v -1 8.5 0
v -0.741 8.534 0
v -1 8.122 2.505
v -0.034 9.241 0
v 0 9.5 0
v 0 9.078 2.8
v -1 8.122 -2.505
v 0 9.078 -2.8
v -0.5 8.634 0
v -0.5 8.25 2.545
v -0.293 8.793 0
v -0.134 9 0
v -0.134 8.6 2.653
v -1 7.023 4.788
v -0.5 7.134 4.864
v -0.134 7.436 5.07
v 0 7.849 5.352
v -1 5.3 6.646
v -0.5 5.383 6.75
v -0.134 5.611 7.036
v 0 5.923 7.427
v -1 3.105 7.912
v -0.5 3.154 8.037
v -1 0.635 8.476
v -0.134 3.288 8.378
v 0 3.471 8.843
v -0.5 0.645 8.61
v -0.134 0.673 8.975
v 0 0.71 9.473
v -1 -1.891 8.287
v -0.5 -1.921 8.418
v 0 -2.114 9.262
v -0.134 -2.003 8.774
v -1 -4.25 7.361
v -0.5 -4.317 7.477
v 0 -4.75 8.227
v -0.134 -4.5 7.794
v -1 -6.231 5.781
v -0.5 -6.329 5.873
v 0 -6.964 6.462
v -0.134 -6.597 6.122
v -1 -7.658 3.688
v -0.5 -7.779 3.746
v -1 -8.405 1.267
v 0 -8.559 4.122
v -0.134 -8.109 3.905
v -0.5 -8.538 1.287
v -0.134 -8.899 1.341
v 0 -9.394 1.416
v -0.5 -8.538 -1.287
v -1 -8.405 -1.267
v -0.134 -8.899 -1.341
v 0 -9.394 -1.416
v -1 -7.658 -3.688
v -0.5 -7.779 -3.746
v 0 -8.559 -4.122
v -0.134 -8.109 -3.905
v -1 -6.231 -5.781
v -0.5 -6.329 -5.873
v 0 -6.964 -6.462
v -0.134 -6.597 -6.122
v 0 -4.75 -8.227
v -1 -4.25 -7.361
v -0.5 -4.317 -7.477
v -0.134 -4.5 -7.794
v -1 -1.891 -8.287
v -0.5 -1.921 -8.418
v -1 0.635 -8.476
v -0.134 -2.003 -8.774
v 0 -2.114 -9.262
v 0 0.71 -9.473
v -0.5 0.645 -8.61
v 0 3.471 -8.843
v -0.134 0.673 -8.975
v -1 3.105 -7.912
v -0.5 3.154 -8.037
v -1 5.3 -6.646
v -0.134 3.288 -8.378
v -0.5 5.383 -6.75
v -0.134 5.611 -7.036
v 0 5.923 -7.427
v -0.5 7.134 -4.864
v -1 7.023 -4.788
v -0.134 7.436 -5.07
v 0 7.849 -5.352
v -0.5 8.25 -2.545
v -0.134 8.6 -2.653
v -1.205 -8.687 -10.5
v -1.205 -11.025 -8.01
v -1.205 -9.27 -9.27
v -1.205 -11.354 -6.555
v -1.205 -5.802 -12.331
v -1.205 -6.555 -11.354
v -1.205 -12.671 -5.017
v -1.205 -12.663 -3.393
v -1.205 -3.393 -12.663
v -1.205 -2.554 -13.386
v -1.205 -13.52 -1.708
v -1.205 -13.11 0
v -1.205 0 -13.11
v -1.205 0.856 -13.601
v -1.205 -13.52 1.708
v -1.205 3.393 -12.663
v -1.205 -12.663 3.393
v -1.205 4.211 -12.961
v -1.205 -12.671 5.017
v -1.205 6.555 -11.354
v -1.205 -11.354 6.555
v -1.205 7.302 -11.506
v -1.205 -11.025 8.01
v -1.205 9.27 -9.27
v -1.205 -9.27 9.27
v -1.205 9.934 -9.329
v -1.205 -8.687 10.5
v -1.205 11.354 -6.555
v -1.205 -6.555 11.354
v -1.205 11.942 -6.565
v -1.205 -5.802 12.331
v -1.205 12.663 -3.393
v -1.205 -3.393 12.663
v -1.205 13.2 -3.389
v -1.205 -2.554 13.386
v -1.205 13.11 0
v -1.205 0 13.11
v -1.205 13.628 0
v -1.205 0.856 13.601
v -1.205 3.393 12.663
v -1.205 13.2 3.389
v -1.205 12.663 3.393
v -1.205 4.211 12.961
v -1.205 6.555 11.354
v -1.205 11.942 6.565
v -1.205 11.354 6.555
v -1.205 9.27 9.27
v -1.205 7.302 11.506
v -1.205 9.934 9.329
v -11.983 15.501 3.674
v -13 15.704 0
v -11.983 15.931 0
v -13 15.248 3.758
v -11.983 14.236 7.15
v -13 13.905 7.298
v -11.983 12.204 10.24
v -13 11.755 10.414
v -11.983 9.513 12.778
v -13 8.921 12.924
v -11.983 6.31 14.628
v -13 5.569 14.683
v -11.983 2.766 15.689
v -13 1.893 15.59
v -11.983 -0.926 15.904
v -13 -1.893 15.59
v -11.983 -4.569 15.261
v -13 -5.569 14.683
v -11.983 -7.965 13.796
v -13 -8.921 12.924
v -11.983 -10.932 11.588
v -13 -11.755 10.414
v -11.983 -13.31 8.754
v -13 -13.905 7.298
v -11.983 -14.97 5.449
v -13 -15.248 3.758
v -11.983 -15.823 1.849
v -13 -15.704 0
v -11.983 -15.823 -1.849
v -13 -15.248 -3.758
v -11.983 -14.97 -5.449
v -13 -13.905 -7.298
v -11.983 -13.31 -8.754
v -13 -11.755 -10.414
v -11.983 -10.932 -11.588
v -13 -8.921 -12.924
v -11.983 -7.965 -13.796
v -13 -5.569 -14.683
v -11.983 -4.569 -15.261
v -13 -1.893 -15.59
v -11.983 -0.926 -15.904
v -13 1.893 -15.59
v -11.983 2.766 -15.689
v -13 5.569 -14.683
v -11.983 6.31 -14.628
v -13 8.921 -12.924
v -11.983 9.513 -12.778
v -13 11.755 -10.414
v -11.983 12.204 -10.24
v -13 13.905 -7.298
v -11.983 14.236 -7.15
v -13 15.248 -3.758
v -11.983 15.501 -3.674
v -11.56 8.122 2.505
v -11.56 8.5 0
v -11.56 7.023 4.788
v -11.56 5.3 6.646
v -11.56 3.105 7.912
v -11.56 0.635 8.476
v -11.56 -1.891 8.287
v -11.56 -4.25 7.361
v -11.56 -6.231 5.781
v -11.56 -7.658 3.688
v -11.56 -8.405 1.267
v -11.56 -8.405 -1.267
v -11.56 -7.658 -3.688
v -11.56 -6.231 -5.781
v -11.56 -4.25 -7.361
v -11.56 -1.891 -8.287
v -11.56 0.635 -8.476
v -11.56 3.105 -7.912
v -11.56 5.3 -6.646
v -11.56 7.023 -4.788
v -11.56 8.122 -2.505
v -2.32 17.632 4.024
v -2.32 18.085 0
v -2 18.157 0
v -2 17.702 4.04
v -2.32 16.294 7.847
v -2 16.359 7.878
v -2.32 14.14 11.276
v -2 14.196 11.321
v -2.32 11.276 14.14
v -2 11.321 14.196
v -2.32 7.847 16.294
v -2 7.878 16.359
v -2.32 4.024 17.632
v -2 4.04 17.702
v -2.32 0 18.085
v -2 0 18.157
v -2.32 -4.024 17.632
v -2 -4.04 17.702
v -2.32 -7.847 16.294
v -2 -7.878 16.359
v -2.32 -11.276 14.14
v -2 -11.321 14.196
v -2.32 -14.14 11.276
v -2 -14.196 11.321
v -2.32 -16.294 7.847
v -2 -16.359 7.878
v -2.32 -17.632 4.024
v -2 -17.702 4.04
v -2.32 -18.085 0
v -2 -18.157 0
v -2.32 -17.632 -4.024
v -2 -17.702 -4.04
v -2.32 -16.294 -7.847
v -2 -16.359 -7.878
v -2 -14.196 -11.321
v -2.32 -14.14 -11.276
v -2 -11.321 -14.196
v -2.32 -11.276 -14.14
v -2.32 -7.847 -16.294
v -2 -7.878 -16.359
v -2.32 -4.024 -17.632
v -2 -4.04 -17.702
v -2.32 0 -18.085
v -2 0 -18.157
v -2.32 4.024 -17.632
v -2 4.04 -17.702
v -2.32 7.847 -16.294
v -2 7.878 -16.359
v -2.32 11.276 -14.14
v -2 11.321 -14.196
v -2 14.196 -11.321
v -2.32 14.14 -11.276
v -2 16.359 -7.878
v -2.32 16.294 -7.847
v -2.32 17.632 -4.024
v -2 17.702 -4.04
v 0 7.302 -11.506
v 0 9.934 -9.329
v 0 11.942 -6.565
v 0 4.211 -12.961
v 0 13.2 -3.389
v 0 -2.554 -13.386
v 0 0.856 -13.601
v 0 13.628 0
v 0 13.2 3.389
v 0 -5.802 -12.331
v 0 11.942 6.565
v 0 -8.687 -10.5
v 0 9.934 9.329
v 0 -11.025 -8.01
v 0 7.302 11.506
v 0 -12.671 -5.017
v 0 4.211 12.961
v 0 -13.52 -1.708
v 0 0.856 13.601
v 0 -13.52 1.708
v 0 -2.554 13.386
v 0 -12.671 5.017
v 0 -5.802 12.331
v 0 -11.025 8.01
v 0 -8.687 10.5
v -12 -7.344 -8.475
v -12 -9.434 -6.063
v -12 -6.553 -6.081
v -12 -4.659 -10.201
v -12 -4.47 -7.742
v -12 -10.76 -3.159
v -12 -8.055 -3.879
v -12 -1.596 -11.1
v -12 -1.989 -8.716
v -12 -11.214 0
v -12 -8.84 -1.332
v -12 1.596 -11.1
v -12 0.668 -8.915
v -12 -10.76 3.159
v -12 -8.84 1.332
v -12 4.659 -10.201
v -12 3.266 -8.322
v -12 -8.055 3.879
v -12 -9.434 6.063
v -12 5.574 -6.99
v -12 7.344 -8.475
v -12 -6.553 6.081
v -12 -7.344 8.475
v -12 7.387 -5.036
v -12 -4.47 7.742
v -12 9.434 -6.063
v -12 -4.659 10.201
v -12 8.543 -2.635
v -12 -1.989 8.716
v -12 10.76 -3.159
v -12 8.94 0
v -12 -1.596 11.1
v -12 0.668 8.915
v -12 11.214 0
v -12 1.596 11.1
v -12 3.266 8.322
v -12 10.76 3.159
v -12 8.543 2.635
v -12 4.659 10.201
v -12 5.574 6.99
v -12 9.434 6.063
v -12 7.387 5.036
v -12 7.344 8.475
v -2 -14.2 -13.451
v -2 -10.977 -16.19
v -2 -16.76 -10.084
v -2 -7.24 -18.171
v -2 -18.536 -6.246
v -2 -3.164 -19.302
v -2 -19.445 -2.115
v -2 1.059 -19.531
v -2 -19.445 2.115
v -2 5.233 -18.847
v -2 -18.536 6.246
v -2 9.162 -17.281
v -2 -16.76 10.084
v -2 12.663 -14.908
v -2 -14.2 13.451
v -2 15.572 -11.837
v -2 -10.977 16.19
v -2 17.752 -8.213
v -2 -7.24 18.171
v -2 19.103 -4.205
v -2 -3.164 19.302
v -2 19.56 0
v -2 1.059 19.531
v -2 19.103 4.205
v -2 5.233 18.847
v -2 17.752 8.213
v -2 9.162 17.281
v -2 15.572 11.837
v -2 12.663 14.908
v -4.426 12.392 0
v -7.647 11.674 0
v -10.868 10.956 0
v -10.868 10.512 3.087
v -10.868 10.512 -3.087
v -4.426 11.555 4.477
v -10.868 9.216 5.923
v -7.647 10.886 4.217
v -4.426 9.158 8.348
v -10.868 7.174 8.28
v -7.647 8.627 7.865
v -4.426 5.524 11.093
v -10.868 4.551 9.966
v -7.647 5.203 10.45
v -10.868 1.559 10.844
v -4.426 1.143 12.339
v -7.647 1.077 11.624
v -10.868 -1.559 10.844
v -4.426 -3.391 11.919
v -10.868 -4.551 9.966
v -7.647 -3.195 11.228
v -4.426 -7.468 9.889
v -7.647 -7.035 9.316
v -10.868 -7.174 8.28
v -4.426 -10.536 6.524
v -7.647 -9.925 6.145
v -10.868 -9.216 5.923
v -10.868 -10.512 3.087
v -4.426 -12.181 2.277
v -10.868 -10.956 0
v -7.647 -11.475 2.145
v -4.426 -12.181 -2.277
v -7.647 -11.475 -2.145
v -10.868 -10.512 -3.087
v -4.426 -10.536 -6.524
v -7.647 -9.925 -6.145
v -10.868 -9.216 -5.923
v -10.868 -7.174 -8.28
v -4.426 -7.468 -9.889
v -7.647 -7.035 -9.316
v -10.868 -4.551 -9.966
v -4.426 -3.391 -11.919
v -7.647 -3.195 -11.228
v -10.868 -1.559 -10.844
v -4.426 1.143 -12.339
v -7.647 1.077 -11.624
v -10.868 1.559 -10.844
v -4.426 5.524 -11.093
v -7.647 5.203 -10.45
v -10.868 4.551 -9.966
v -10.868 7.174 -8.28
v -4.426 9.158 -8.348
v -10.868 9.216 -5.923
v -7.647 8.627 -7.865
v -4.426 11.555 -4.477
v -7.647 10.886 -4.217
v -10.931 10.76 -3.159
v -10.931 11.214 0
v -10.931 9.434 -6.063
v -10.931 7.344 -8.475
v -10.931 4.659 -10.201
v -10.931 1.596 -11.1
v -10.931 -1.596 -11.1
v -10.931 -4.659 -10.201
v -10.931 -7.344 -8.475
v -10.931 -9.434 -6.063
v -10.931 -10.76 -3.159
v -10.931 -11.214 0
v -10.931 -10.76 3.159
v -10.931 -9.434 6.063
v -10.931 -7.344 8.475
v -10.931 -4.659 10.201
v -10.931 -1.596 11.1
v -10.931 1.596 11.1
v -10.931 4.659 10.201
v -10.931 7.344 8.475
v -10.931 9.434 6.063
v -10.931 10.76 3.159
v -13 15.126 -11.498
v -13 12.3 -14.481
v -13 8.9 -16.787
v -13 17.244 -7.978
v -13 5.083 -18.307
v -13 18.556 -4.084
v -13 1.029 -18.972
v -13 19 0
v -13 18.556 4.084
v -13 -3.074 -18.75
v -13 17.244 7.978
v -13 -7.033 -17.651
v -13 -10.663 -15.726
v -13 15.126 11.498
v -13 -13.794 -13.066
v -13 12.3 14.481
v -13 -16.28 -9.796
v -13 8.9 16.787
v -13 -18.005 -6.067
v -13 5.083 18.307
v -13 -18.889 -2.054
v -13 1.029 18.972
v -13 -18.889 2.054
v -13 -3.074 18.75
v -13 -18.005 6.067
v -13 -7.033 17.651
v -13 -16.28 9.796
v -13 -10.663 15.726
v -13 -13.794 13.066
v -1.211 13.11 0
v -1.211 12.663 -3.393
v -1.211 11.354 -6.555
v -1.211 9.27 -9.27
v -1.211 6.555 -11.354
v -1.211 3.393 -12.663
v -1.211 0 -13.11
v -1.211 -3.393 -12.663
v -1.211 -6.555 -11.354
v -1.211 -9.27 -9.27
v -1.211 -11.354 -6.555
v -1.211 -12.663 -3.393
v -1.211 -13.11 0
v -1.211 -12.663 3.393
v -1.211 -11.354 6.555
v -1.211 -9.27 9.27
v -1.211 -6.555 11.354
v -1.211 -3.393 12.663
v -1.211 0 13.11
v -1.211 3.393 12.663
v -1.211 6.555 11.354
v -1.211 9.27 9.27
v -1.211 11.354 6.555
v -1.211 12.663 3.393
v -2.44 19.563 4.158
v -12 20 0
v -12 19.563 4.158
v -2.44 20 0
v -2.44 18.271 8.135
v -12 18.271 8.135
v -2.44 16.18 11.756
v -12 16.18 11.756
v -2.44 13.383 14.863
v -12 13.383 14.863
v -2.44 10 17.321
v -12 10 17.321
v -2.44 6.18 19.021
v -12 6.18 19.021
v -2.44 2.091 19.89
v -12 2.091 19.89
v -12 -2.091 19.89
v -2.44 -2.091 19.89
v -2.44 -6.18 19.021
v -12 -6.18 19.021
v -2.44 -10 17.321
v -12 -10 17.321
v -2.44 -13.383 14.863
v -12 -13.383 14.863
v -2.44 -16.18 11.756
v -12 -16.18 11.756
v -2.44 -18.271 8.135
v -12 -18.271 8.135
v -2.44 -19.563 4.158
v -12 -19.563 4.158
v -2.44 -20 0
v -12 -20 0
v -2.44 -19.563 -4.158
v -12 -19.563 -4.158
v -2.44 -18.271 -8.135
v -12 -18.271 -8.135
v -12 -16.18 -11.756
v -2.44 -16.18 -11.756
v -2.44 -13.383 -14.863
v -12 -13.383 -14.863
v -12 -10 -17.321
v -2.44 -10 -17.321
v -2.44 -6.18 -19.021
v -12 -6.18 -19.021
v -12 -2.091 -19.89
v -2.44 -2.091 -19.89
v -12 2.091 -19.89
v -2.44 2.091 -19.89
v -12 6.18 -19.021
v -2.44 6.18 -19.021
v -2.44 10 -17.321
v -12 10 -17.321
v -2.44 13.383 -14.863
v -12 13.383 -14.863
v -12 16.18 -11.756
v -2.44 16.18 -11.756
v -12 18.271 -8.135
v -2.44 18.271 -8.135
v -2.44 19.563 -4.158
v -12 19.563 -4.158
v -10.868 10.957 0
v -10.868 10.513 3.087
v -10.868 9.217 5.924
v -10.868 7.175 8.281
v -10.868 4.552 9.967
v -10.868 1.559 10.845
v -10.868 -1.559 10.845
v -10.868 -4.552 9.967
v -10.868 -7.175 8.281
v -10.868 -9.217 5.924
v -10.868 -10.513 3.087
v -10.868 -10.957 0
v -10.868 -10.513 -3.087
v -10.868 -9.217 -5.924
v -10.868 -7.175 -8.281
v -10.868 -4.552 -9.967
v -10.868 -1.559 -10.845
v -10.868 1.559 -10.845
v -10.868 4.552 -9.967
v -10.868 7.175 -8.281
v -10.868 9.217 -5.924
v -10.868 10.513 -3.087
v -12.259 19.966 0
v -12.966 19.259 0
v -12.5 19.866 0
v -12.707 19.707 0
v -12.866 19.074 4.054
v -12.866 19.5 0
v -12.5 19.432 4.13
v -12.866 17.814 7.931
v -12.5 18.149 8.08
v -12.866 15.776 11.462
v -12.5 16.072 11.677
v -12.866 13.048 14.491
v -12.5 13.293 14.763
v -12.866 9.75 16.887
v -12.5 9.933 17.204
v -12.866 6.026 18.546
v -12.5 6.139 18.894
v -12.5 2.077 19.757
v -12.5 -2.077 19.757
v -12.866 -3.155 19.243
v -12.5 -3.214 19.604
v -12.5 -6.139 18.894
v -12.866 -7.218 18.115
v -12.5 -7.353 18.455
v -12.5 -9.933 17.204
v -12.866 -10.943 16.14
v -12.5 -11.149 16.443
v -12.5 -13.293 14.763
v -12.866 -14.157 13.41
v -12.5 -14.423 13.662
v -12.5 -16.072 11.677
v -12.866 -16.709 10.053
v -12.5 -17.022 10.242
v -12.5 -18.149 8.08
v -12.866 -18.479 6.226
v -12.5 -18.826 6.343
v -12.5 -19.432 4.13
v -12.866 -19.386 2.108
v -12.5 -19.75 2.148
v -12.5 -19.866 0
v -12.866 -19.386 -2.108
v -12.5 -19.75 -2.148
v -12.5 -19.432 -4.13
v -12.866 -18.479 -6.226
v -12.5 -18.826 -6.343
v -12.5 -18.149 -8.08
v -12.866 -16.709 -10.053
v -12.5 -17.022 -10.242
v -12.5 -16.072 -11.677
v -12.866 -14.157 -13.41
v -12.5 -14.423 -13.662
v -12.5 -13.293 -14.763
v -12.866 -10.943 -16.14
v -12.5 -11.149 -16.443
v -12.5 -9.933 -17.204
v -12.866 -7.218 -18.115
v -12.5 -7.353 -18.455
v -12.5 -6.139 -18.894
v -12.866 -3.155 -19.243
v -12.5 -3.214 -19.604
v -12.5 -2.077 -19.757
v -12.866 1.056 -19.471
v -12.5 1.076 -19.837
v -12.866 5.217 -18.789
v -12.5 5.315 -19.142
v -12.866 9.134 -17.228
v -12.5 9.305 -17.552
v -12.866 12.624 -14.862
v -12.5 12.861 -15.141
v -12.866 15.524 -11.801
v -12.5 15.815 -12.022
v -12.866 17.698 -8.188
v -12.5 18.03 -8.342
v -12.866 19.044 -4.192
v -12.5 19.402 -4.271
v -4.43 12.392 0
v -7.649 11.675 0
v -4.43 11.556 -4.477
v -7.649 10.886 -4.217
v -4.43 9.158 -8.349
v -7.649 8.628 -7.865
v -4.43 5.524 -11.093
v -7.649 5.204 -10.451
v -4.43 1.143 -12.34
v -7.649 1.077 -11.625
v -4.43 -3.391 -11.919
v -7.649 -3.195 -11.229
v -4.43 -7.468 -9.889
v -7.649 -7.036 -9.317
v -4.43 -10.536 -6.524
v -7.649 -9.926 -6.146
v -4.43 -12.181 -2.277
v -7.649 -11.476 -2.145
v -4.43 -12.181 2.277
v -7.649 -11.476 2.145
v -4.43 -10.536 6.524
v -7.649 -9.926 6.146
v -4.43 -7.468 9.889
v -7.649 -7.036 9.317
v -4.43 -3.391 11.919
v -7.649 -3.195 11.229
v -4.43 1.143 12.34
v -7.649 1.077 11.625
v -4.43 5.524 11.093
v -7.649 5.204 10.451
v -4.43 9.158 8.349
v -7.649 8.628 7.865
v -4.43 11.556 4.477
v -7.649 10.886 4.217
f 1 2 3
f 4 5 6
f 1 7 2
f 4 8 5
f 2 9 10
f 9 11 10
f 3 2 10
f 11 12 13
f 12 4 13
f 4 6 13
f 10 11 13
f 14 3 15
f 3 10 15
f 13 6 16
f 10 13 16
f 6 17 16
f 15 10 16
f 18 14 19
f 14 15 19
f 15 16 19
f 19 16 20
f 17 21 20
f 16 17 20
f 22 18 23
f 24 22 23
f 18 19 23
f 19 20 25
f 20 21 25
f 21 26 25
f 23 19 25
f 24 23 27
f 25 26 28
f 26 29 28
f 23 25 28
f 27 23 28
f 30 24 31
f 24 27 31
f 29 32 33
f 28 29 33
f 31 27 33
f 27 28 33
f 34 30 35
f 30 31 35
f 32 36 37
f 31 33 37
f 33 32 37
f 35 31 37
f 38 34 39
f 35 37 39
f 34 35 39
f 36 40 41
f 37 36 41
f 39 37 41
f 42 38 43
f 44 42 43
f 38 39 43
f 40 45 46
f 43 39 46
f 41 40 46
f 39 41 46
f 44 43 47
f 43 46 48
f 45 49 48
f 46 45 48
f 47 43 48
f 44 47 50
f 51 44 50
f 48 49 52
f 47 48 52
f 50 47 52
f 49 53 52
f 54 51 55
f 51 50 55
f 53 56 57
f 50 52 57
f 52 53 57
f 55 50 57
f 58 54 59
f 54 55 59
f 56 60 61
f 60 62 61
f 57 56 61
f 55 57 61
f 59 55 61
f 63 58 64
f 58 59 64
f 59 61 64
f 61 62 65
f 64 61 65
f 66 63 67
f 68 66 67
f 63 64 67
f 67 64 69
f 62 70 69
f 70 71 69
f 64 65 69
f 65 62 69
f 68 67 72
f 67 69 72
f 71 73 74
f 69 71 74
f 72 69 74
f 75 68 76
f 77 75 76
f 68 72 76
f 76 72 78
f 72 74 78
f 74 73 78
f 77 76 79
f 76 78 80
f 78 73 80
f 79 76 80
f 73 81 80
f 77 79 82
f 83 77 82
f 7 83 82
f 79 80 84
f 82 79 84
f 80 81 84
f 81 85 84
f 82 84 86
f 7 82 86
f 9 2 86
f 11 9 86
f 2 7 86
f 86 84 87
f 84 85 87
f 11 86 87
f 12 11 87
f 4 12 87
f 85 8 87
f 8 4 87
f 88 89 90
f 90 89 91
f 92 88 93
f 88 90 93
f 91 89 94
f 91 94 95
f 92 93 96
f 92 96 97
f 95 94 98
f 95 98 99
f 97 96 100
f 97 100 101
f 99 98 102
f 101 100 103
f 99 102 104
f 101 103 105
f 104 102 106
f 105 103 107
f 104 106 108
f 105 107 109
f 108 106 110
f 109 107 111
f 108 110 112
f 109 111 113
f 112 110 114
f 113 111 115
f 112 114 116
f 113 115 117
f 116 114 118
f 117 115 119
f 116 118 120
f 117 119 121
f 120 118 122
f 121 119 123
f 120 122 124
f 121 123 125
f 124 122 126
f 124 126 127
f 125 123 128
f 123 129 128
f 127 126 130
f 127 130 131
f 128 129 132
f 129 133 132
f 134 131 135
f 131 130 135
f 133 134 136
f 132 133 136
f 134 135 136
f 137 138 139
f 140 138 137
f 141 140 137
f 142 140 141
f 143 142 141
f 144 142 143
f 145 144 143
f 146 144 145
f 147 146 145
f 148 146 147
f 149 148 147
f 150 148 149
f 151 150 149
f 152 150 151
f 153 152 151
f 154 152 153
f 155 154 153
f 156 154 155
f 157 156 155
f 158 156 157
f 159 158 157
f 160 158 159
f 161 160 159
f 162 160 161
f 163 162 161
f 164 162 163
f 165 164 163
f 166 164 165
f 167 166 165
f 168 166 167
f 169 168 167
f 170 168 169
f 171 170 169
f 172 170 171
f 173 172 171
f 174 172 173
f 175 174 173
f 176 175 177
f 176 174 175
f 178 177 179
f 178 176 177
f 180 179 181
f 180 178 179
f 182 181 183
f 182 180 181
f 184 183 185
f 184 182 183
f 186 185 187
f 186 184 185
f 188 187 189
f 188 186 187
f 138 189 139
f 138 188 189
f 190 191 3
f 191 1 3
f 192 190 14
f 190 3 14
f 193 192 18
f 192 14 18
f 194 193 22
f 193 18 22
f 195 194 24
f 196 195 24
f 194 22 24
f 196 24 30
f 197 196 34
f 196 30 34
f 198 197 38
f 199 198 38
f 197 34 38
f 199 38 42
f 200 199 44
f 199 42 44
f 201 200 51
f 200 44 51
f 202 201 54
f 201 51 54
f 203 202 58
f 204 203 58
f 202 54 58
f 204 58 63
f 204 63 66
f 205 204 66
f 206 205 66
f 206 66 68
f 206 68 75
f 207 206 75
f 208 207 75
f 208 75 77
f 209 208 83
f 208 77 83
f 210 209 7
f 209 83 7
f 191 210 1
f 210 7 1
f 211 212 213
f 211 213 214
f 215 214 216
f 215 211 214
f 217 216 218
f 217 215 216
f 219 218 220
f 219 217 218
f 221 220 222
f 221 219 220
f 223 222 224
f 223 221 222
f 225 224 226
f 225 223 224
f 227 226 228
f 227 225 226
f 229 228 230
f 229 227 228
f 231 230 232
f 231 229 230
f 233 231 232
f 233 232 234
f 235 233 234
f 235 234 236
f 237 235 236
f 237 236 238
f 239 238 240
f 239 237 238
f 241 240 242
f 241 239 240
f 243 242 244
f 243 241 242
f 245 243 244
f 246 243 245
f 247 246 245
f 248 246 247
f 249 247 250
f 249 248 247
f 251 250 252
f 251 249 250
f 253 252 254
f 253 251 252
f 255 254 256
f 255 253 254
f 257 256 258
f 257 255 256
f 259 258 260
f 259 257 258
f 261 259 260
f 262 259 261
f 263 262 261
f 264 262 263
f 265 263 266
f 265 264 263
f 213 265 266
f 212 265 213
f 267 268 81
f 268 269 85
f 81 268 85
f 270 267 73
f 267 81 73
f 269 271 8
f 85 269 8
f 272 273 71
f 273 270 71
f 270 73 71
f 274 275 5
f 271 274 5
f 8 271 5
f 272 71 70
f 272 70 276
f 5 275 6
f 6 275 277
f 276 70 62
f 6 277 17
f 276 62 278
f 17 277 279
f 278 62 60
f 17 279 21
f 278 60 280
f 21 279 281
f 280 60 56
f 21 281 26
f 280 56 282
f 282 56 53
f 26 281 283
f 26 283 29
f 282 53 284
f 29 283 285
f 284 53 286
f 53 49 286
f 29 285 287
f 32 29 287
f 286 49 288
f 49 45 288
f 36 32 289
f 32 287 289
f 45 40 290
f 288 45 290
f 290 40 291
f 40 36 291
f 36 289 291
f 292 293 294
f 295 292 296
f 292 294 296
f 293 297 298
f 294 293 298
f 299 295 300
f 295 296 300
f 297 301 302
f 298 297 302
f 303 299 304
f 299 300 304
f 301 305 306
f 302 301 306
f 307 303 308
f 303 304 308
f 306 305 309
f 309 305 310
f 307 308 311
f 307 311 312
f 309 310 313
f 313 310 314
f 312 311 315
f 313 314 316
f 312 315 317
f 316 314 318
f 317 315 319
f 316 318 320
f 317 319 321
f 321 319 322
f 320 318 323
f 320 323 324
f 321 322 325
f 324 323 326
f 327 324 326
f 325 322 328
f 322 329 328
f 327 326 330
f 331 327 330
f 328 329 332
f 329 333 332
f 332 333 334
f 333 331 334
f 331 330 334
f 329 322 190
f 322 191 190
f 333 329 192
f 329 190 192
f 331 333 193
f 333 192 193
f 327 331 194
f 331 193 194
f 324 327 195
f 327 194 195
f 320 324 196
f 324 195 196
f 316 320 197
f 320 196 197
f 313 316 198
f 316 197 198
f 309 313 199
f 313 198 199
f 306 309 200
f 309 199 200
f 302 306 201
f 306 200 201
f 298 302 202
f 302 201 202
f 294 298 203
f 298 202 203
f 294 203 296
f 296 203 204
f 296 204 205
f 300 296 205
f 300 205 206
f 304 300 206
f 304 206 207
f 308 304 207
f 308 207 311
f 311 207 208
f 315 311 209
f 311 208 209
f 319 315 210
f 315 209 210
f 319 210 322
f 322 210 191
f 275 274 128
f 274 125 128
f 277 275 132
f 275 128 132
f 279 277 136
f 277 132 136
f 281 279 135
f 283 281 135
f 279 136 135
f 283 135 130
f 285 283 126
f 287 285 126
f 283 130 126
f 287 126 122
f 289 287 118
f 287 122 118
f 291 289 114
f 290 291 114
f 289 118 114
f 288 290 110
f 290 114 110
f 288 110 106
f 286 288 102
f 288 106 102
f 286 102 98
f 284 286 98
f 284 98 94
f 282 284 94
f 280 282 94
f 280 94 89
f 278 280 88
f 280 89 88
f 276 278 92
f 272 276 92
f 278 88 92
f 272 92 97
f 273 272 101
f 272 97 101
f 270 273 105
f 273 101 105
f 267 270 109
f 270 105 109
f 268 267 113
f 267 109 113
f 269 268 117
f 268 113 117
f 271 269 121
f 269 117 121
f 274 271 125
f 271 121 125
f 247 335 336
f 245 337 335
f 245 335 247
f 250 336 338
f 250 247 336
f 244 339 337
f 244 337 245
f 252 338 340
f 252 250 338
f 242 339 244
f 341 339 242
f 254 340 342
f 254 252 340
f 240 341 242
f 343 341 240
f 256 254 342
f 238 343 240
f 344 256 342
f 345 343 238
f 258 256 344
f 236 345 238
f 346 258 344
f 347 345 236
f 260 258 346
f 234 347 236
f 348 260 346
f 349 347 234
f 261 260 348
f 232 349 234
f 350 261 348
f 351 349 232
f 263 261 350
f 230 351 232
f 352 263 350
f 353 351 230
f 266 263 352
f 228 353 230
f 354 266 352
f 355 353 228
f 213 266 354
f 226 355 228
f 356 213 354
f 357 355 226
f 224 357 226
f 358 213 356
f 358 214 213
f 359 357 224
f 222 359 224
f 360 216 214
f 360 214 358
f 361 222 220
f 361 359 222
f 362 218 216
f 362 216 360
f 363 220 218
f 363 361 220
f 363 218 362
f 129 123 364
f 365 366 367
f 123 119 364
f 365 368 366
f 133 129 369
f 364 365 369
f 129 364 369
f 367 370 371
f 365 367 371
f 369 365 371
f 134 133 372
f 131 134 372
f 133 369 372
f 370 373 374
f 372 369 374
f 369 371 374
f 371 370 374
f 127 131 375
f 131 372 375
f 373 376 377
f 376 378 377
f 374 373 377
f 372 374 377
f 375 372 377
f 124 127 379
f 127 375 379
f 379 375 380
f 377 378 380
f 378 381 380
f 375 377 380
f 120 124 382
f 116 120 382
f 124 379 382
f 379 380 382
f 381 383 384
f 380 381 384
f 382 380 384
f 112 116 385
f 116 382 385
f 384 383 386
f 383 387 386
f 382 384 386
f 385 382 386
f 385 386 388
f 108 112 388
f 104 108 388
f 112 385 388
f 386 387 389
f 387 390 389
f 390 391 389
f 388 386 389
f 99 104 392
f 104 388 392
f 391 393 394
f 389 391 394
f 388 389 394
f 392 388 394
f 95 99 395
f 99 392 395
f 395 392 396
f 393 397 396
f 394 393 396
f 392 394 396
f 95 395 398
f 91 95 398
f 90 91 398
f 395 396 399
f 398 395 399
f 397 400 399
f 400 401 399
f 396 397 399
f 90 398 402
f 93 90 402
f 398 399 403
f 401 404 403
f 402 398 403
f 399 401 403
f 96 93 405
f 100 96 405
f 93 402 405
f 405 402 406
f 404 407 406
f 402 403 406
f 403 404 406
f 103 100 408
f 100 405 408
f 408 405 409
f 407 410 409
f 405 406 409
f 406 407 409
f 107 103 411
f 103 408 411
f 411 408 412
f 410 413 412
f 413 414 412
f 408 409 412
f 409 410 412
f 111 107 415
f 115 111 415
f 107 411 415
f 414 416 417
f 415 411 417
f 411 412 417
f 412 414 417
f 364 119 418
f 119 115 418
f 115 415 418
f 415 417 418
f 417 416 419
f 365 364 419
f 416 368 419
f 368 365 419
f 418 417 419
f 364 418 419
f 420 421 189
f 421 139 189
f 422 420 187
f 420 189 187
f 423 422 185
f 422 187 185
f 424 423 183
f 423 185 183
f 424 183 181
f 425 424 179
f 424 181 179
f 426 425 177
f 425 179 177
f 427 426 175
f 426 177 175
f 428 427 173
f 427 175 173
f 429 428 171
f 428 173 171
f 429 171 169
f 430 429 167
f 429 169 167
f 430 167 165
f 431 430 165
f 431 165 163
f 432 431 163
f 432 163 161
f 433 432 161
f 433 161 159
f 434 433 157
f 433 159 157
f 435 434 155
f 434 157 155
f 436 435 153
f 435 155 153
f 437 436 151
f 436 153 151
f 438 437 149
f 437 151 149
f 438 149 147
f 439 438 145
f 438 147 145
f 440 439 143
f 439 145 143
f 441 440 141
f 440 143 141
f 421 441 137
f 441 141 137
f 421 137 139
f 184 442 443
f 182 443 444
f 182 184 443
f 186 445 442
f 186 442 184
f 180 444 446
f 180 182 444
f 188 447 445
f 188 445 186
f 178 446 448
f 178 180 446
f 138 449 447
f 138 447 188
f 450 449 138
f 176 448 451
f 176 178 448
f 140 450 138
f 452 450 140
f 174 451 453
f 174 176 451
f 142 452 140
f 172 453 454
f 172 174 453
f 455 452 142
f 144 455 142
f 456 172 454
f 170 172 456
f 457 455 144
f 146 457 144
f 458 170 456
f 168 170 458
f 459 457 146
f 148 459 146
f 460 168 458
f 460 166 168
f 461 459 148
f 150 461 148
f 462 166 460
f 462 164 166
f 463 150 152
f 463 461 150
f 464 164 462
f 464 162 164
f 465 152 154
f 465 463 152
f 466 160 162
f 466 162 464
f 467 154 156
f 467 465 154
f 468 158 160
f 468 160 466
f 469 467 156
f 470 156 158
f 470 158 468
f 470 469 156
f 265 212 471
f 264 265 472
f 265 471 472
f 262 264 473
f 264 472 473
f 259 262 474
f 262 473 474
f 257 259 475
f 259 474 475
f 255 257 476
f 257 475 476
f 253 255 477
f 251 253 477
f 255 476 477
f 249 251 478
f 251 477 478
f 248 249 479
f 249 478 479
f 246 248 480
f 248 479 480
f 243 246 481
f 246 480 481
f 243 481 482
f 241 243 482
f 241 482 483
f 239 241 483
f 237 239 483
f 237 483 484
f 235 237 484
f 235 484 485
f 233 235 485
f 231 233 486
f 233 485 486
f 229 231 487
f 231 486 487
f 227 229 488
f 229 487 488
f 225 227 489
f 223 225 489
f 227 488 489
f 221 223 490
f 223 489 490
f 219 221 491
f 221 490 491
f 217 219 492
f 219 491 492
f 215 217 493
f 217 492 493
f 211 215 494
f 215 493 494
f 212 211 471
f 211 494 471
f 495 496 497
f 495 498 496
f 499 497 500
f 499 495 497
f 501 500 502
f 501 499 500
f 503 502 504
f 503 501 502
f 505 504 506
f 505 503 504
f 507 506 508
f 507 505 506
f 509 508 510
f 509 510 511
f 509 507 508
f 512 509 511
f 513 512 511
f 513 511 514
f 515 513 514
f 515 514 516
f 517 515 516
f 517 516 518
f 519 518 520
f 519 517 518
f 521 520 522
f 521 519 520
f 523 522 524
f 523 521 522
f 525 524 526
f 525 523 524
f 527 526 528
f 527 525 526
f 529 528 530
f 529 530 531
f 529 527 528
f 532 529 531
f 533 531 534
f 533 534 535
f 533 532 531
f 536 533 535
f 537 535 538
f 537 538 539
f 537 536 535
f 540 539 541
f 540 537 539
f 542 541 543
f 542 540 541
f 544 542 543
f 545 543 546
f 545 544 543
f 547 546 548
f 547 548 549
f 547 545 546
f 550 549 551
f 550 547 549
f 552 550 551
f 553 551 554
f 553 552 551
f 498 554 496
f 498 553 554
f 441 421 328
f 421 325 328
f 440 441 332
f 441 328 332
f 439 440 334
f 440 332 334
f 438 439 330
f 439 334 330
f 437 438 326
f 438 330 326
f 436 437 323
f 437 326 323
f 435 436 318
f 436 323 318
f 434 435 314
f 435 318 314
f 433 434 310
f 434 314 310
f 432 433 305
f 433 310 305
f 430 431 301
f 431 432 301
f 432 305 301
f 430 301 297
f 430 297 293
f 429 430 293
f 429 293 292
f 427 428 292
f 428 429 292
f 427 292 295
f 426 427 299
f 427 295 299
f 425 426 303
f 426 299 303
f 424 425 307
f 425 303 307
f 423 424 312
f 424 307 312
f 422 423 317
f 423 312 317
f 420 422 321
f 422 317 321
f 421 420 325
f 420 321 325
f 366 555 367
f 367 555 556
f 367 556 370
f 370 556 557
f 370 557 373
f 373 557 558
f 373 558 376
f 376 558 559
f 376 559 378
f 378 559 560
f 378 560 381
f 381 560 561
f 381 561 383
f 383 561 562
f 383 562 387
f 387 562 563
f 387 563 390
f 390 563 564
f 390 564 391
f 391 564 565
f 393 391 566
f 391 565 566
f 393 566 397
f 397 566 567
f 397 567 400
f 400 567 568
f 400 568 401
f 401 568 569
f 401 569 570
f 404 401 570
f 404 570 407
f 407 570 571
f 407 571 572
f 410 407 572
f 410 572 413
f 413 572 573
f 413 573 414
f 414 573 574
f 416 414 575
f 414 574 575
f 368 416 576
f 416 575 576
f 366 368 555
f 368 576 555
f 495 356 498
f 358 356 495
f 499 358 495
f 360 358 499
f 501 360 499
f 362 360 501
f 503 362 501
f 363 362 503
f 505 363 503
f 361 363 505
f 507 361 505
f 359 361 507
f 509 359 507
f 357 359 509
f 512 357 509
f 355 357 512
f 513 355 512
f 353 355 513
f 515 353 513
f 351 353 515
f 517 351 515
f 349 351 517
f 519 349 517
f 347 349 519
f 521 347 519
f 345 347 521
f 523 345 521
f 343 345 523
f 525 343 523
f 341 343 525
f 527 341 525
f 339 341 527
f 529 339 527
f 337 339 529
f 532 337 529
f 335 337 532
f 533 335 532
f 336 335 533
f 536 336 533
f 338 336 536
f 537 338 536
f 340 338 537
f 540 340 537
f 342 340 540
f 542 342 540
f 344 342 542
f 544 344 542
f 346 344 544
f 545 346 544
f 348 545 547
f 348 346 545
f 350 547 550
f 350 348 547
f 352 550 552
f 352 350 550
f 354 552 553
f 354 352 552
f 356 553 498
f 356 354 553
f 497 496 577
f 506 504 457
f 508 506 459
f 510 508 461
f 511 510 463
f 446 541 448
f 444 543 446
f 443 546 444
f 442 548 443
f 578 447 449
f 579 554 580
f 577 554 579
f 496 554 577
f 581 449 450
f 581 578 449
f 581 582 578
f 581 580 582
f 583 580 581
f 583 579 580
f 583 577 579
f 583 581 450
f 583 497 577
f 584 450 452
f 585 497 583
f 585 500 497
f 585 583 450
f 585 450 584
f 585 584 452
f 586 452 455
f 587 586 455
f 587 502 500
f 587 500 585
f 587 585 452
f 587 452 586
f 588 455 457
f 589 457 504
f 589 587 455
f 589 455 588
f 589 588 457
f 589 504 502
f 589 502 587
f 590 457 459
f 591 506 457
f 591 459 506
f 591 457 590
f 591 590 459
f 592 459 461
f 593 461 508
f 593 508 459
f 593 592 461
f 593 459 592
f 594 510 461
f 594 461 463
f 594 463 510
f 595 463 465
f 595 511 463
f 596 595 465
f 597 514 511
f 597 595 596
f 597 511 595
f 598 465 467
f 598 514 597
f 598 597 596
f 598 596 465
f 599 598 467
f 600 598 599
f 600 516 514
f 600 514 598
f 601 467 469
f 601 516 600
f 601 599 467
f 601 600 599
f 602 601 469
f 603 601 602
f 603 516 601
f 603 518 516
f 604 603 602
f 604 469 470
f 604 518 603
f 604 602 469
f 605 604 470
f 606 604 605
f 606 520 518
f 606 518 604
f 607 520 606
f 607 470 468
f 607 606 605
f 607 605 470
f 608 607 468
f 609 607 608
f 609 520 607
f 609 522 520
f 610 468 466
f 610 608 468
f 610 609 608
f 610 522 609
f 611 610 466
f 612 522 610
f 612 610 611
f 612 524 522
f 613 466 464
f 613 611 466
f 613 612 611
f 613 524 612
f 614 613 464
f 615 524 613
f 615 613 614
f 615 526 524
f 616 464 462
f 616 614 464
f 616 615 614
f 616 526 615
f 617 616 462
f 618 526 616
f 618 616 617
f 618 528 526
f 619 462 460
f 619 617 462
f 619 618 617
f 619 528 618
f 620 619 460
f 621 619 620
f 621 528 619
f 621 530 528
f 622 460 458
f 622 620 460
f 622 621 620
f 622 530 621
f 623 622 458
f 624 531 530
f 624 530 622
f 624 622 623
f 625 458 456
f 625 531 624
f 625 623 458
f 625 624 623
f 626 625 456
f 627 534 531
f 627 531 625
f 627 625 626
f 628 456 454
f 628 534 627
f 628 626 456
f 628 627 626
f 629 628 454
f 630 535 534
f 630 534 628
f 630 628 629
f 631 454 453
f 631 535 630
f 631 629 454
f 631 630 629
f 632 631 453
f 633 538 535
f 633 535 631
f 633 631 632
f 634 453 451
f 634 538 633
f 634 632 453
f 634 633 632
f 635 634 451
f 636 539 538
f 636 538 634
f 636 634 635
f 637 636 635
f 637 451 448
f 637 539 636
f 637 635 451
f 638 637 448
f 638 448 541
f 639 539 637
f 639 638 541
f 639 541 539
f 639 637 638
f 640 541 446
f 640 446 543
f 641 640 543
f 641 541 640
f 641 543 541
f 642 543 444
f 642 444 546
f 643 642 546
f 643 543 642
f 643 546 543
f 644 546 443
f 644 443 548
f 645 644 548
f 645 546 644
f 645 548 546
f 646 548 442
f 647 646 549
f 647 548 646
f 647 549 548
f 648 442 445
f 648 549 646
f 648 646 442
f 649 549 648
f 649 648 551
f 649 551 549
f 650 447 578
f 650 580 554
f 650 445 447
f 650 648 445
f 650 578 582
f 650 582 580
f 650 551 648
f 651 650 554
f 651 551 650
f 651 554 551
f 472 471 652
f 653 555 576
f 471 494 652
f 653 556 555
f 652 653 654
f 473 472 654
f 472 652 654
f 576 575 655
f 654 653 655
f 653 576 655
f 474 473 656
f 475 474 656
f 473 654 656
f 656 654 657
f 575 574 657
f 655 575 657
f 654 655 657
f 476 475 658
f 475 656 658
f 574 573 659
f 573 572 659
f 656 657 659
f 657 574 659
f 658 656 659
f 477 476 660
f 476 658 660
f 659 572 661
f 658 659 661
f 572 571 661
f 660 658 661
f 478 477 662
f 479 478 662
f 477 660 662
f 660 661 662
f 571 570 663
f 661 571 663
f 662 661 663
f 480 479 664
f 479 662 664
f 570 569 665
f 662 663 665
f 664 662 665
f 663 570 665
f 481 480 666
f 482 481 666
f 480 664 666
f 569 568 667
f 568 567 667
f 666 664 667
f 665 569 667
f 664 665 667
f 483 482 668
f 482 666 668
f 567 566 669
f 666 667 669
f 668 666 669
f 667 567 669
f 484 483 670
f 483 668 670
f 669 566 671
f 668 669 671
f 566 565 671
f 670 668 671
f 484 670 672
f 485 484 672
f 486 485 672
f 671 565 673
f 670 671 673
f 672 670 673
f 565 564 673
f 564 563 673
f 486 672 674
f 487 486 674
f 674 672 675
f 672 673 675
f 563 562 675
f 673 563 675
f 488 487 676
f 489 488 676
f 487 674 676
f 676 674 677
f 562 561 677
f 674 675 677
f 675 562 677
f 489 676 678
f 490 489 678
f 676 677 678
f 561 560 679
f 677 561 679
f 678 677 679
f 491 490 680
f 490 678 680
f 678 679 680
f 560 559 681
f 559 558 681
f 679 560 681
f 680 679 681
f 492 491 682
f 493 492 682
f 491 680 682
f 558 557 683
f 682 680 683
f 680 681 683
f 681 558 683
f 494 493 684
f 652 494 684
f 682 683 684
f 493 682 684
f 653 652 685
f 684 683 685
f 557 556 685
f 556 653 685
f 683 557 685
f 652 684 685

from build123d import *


with BuildPart() as part:
    # OutRacSke → OuterRace (revolve)
    with BuildSketch(Plane.XY):
        with BuildLine():
            Line((-2, 18.15674466), (-13, 15.704))
            Line((-13, 15.704), (-13, 19))
            ThreePointArc((-13, 19), (-12.707106781, 19.707106781), (-12, 20))
            Line((-12, 20), (-2.44, 20))
            Line((-2.44, 20), (-2, 19.56))
            Line((-2, 19.56), (-2, 18.15674466))
        make_face()
    revolve(axis=Axis((-42.5, 0, 0), (1, 0, 0)))

    # RolSimSke → RollersSimplified (revolve)
    with BuildSketch(Plane.XY):
        Polygon((-12, 16.006611671), (-2.337294608, 18.161170676), (-1.211047855, 13.110211039), (-10.873753248, 10.955652034), align=None)
    revolve(axis=Axis((0, 0, 0), (-1, 0, 0)))

    # InsRacSke → InnerRace (revolve)
    with BuildSketch(Plane.XY):
        with BuildLine():
            Line((-10.925817259, 11.214402034), (-12, 11.214402034))
            Line((-12, 11.214402034), (-12, 8.94))
            Line((-12, 8.94), (-11.56, 8.5))
            Line((-11.56, 8.5), (-1, 8.5))
            ThreePointArc((-1, 8.5), (-0.292893219, 8.792893219), (0, 9.5))
            Line((0, 9.5), (0, 13.627711039))
            Line((0, 13.627711039), (-1.205416623, 13.627711039))
            Line((-1.205416623, 13.627711039), (-1.205416623, 13.110211039))
            Line((-1.205416623, 13.110211039), (-10.868122015, 10.955652034))
            Line((-10.868122015, 10.955652034), (-10.925817259, 11.214402034))
        make_face()
    revolve(axis=Axis((-42.5, 0, 0), (1, 0, 0)))


solid = part.part
